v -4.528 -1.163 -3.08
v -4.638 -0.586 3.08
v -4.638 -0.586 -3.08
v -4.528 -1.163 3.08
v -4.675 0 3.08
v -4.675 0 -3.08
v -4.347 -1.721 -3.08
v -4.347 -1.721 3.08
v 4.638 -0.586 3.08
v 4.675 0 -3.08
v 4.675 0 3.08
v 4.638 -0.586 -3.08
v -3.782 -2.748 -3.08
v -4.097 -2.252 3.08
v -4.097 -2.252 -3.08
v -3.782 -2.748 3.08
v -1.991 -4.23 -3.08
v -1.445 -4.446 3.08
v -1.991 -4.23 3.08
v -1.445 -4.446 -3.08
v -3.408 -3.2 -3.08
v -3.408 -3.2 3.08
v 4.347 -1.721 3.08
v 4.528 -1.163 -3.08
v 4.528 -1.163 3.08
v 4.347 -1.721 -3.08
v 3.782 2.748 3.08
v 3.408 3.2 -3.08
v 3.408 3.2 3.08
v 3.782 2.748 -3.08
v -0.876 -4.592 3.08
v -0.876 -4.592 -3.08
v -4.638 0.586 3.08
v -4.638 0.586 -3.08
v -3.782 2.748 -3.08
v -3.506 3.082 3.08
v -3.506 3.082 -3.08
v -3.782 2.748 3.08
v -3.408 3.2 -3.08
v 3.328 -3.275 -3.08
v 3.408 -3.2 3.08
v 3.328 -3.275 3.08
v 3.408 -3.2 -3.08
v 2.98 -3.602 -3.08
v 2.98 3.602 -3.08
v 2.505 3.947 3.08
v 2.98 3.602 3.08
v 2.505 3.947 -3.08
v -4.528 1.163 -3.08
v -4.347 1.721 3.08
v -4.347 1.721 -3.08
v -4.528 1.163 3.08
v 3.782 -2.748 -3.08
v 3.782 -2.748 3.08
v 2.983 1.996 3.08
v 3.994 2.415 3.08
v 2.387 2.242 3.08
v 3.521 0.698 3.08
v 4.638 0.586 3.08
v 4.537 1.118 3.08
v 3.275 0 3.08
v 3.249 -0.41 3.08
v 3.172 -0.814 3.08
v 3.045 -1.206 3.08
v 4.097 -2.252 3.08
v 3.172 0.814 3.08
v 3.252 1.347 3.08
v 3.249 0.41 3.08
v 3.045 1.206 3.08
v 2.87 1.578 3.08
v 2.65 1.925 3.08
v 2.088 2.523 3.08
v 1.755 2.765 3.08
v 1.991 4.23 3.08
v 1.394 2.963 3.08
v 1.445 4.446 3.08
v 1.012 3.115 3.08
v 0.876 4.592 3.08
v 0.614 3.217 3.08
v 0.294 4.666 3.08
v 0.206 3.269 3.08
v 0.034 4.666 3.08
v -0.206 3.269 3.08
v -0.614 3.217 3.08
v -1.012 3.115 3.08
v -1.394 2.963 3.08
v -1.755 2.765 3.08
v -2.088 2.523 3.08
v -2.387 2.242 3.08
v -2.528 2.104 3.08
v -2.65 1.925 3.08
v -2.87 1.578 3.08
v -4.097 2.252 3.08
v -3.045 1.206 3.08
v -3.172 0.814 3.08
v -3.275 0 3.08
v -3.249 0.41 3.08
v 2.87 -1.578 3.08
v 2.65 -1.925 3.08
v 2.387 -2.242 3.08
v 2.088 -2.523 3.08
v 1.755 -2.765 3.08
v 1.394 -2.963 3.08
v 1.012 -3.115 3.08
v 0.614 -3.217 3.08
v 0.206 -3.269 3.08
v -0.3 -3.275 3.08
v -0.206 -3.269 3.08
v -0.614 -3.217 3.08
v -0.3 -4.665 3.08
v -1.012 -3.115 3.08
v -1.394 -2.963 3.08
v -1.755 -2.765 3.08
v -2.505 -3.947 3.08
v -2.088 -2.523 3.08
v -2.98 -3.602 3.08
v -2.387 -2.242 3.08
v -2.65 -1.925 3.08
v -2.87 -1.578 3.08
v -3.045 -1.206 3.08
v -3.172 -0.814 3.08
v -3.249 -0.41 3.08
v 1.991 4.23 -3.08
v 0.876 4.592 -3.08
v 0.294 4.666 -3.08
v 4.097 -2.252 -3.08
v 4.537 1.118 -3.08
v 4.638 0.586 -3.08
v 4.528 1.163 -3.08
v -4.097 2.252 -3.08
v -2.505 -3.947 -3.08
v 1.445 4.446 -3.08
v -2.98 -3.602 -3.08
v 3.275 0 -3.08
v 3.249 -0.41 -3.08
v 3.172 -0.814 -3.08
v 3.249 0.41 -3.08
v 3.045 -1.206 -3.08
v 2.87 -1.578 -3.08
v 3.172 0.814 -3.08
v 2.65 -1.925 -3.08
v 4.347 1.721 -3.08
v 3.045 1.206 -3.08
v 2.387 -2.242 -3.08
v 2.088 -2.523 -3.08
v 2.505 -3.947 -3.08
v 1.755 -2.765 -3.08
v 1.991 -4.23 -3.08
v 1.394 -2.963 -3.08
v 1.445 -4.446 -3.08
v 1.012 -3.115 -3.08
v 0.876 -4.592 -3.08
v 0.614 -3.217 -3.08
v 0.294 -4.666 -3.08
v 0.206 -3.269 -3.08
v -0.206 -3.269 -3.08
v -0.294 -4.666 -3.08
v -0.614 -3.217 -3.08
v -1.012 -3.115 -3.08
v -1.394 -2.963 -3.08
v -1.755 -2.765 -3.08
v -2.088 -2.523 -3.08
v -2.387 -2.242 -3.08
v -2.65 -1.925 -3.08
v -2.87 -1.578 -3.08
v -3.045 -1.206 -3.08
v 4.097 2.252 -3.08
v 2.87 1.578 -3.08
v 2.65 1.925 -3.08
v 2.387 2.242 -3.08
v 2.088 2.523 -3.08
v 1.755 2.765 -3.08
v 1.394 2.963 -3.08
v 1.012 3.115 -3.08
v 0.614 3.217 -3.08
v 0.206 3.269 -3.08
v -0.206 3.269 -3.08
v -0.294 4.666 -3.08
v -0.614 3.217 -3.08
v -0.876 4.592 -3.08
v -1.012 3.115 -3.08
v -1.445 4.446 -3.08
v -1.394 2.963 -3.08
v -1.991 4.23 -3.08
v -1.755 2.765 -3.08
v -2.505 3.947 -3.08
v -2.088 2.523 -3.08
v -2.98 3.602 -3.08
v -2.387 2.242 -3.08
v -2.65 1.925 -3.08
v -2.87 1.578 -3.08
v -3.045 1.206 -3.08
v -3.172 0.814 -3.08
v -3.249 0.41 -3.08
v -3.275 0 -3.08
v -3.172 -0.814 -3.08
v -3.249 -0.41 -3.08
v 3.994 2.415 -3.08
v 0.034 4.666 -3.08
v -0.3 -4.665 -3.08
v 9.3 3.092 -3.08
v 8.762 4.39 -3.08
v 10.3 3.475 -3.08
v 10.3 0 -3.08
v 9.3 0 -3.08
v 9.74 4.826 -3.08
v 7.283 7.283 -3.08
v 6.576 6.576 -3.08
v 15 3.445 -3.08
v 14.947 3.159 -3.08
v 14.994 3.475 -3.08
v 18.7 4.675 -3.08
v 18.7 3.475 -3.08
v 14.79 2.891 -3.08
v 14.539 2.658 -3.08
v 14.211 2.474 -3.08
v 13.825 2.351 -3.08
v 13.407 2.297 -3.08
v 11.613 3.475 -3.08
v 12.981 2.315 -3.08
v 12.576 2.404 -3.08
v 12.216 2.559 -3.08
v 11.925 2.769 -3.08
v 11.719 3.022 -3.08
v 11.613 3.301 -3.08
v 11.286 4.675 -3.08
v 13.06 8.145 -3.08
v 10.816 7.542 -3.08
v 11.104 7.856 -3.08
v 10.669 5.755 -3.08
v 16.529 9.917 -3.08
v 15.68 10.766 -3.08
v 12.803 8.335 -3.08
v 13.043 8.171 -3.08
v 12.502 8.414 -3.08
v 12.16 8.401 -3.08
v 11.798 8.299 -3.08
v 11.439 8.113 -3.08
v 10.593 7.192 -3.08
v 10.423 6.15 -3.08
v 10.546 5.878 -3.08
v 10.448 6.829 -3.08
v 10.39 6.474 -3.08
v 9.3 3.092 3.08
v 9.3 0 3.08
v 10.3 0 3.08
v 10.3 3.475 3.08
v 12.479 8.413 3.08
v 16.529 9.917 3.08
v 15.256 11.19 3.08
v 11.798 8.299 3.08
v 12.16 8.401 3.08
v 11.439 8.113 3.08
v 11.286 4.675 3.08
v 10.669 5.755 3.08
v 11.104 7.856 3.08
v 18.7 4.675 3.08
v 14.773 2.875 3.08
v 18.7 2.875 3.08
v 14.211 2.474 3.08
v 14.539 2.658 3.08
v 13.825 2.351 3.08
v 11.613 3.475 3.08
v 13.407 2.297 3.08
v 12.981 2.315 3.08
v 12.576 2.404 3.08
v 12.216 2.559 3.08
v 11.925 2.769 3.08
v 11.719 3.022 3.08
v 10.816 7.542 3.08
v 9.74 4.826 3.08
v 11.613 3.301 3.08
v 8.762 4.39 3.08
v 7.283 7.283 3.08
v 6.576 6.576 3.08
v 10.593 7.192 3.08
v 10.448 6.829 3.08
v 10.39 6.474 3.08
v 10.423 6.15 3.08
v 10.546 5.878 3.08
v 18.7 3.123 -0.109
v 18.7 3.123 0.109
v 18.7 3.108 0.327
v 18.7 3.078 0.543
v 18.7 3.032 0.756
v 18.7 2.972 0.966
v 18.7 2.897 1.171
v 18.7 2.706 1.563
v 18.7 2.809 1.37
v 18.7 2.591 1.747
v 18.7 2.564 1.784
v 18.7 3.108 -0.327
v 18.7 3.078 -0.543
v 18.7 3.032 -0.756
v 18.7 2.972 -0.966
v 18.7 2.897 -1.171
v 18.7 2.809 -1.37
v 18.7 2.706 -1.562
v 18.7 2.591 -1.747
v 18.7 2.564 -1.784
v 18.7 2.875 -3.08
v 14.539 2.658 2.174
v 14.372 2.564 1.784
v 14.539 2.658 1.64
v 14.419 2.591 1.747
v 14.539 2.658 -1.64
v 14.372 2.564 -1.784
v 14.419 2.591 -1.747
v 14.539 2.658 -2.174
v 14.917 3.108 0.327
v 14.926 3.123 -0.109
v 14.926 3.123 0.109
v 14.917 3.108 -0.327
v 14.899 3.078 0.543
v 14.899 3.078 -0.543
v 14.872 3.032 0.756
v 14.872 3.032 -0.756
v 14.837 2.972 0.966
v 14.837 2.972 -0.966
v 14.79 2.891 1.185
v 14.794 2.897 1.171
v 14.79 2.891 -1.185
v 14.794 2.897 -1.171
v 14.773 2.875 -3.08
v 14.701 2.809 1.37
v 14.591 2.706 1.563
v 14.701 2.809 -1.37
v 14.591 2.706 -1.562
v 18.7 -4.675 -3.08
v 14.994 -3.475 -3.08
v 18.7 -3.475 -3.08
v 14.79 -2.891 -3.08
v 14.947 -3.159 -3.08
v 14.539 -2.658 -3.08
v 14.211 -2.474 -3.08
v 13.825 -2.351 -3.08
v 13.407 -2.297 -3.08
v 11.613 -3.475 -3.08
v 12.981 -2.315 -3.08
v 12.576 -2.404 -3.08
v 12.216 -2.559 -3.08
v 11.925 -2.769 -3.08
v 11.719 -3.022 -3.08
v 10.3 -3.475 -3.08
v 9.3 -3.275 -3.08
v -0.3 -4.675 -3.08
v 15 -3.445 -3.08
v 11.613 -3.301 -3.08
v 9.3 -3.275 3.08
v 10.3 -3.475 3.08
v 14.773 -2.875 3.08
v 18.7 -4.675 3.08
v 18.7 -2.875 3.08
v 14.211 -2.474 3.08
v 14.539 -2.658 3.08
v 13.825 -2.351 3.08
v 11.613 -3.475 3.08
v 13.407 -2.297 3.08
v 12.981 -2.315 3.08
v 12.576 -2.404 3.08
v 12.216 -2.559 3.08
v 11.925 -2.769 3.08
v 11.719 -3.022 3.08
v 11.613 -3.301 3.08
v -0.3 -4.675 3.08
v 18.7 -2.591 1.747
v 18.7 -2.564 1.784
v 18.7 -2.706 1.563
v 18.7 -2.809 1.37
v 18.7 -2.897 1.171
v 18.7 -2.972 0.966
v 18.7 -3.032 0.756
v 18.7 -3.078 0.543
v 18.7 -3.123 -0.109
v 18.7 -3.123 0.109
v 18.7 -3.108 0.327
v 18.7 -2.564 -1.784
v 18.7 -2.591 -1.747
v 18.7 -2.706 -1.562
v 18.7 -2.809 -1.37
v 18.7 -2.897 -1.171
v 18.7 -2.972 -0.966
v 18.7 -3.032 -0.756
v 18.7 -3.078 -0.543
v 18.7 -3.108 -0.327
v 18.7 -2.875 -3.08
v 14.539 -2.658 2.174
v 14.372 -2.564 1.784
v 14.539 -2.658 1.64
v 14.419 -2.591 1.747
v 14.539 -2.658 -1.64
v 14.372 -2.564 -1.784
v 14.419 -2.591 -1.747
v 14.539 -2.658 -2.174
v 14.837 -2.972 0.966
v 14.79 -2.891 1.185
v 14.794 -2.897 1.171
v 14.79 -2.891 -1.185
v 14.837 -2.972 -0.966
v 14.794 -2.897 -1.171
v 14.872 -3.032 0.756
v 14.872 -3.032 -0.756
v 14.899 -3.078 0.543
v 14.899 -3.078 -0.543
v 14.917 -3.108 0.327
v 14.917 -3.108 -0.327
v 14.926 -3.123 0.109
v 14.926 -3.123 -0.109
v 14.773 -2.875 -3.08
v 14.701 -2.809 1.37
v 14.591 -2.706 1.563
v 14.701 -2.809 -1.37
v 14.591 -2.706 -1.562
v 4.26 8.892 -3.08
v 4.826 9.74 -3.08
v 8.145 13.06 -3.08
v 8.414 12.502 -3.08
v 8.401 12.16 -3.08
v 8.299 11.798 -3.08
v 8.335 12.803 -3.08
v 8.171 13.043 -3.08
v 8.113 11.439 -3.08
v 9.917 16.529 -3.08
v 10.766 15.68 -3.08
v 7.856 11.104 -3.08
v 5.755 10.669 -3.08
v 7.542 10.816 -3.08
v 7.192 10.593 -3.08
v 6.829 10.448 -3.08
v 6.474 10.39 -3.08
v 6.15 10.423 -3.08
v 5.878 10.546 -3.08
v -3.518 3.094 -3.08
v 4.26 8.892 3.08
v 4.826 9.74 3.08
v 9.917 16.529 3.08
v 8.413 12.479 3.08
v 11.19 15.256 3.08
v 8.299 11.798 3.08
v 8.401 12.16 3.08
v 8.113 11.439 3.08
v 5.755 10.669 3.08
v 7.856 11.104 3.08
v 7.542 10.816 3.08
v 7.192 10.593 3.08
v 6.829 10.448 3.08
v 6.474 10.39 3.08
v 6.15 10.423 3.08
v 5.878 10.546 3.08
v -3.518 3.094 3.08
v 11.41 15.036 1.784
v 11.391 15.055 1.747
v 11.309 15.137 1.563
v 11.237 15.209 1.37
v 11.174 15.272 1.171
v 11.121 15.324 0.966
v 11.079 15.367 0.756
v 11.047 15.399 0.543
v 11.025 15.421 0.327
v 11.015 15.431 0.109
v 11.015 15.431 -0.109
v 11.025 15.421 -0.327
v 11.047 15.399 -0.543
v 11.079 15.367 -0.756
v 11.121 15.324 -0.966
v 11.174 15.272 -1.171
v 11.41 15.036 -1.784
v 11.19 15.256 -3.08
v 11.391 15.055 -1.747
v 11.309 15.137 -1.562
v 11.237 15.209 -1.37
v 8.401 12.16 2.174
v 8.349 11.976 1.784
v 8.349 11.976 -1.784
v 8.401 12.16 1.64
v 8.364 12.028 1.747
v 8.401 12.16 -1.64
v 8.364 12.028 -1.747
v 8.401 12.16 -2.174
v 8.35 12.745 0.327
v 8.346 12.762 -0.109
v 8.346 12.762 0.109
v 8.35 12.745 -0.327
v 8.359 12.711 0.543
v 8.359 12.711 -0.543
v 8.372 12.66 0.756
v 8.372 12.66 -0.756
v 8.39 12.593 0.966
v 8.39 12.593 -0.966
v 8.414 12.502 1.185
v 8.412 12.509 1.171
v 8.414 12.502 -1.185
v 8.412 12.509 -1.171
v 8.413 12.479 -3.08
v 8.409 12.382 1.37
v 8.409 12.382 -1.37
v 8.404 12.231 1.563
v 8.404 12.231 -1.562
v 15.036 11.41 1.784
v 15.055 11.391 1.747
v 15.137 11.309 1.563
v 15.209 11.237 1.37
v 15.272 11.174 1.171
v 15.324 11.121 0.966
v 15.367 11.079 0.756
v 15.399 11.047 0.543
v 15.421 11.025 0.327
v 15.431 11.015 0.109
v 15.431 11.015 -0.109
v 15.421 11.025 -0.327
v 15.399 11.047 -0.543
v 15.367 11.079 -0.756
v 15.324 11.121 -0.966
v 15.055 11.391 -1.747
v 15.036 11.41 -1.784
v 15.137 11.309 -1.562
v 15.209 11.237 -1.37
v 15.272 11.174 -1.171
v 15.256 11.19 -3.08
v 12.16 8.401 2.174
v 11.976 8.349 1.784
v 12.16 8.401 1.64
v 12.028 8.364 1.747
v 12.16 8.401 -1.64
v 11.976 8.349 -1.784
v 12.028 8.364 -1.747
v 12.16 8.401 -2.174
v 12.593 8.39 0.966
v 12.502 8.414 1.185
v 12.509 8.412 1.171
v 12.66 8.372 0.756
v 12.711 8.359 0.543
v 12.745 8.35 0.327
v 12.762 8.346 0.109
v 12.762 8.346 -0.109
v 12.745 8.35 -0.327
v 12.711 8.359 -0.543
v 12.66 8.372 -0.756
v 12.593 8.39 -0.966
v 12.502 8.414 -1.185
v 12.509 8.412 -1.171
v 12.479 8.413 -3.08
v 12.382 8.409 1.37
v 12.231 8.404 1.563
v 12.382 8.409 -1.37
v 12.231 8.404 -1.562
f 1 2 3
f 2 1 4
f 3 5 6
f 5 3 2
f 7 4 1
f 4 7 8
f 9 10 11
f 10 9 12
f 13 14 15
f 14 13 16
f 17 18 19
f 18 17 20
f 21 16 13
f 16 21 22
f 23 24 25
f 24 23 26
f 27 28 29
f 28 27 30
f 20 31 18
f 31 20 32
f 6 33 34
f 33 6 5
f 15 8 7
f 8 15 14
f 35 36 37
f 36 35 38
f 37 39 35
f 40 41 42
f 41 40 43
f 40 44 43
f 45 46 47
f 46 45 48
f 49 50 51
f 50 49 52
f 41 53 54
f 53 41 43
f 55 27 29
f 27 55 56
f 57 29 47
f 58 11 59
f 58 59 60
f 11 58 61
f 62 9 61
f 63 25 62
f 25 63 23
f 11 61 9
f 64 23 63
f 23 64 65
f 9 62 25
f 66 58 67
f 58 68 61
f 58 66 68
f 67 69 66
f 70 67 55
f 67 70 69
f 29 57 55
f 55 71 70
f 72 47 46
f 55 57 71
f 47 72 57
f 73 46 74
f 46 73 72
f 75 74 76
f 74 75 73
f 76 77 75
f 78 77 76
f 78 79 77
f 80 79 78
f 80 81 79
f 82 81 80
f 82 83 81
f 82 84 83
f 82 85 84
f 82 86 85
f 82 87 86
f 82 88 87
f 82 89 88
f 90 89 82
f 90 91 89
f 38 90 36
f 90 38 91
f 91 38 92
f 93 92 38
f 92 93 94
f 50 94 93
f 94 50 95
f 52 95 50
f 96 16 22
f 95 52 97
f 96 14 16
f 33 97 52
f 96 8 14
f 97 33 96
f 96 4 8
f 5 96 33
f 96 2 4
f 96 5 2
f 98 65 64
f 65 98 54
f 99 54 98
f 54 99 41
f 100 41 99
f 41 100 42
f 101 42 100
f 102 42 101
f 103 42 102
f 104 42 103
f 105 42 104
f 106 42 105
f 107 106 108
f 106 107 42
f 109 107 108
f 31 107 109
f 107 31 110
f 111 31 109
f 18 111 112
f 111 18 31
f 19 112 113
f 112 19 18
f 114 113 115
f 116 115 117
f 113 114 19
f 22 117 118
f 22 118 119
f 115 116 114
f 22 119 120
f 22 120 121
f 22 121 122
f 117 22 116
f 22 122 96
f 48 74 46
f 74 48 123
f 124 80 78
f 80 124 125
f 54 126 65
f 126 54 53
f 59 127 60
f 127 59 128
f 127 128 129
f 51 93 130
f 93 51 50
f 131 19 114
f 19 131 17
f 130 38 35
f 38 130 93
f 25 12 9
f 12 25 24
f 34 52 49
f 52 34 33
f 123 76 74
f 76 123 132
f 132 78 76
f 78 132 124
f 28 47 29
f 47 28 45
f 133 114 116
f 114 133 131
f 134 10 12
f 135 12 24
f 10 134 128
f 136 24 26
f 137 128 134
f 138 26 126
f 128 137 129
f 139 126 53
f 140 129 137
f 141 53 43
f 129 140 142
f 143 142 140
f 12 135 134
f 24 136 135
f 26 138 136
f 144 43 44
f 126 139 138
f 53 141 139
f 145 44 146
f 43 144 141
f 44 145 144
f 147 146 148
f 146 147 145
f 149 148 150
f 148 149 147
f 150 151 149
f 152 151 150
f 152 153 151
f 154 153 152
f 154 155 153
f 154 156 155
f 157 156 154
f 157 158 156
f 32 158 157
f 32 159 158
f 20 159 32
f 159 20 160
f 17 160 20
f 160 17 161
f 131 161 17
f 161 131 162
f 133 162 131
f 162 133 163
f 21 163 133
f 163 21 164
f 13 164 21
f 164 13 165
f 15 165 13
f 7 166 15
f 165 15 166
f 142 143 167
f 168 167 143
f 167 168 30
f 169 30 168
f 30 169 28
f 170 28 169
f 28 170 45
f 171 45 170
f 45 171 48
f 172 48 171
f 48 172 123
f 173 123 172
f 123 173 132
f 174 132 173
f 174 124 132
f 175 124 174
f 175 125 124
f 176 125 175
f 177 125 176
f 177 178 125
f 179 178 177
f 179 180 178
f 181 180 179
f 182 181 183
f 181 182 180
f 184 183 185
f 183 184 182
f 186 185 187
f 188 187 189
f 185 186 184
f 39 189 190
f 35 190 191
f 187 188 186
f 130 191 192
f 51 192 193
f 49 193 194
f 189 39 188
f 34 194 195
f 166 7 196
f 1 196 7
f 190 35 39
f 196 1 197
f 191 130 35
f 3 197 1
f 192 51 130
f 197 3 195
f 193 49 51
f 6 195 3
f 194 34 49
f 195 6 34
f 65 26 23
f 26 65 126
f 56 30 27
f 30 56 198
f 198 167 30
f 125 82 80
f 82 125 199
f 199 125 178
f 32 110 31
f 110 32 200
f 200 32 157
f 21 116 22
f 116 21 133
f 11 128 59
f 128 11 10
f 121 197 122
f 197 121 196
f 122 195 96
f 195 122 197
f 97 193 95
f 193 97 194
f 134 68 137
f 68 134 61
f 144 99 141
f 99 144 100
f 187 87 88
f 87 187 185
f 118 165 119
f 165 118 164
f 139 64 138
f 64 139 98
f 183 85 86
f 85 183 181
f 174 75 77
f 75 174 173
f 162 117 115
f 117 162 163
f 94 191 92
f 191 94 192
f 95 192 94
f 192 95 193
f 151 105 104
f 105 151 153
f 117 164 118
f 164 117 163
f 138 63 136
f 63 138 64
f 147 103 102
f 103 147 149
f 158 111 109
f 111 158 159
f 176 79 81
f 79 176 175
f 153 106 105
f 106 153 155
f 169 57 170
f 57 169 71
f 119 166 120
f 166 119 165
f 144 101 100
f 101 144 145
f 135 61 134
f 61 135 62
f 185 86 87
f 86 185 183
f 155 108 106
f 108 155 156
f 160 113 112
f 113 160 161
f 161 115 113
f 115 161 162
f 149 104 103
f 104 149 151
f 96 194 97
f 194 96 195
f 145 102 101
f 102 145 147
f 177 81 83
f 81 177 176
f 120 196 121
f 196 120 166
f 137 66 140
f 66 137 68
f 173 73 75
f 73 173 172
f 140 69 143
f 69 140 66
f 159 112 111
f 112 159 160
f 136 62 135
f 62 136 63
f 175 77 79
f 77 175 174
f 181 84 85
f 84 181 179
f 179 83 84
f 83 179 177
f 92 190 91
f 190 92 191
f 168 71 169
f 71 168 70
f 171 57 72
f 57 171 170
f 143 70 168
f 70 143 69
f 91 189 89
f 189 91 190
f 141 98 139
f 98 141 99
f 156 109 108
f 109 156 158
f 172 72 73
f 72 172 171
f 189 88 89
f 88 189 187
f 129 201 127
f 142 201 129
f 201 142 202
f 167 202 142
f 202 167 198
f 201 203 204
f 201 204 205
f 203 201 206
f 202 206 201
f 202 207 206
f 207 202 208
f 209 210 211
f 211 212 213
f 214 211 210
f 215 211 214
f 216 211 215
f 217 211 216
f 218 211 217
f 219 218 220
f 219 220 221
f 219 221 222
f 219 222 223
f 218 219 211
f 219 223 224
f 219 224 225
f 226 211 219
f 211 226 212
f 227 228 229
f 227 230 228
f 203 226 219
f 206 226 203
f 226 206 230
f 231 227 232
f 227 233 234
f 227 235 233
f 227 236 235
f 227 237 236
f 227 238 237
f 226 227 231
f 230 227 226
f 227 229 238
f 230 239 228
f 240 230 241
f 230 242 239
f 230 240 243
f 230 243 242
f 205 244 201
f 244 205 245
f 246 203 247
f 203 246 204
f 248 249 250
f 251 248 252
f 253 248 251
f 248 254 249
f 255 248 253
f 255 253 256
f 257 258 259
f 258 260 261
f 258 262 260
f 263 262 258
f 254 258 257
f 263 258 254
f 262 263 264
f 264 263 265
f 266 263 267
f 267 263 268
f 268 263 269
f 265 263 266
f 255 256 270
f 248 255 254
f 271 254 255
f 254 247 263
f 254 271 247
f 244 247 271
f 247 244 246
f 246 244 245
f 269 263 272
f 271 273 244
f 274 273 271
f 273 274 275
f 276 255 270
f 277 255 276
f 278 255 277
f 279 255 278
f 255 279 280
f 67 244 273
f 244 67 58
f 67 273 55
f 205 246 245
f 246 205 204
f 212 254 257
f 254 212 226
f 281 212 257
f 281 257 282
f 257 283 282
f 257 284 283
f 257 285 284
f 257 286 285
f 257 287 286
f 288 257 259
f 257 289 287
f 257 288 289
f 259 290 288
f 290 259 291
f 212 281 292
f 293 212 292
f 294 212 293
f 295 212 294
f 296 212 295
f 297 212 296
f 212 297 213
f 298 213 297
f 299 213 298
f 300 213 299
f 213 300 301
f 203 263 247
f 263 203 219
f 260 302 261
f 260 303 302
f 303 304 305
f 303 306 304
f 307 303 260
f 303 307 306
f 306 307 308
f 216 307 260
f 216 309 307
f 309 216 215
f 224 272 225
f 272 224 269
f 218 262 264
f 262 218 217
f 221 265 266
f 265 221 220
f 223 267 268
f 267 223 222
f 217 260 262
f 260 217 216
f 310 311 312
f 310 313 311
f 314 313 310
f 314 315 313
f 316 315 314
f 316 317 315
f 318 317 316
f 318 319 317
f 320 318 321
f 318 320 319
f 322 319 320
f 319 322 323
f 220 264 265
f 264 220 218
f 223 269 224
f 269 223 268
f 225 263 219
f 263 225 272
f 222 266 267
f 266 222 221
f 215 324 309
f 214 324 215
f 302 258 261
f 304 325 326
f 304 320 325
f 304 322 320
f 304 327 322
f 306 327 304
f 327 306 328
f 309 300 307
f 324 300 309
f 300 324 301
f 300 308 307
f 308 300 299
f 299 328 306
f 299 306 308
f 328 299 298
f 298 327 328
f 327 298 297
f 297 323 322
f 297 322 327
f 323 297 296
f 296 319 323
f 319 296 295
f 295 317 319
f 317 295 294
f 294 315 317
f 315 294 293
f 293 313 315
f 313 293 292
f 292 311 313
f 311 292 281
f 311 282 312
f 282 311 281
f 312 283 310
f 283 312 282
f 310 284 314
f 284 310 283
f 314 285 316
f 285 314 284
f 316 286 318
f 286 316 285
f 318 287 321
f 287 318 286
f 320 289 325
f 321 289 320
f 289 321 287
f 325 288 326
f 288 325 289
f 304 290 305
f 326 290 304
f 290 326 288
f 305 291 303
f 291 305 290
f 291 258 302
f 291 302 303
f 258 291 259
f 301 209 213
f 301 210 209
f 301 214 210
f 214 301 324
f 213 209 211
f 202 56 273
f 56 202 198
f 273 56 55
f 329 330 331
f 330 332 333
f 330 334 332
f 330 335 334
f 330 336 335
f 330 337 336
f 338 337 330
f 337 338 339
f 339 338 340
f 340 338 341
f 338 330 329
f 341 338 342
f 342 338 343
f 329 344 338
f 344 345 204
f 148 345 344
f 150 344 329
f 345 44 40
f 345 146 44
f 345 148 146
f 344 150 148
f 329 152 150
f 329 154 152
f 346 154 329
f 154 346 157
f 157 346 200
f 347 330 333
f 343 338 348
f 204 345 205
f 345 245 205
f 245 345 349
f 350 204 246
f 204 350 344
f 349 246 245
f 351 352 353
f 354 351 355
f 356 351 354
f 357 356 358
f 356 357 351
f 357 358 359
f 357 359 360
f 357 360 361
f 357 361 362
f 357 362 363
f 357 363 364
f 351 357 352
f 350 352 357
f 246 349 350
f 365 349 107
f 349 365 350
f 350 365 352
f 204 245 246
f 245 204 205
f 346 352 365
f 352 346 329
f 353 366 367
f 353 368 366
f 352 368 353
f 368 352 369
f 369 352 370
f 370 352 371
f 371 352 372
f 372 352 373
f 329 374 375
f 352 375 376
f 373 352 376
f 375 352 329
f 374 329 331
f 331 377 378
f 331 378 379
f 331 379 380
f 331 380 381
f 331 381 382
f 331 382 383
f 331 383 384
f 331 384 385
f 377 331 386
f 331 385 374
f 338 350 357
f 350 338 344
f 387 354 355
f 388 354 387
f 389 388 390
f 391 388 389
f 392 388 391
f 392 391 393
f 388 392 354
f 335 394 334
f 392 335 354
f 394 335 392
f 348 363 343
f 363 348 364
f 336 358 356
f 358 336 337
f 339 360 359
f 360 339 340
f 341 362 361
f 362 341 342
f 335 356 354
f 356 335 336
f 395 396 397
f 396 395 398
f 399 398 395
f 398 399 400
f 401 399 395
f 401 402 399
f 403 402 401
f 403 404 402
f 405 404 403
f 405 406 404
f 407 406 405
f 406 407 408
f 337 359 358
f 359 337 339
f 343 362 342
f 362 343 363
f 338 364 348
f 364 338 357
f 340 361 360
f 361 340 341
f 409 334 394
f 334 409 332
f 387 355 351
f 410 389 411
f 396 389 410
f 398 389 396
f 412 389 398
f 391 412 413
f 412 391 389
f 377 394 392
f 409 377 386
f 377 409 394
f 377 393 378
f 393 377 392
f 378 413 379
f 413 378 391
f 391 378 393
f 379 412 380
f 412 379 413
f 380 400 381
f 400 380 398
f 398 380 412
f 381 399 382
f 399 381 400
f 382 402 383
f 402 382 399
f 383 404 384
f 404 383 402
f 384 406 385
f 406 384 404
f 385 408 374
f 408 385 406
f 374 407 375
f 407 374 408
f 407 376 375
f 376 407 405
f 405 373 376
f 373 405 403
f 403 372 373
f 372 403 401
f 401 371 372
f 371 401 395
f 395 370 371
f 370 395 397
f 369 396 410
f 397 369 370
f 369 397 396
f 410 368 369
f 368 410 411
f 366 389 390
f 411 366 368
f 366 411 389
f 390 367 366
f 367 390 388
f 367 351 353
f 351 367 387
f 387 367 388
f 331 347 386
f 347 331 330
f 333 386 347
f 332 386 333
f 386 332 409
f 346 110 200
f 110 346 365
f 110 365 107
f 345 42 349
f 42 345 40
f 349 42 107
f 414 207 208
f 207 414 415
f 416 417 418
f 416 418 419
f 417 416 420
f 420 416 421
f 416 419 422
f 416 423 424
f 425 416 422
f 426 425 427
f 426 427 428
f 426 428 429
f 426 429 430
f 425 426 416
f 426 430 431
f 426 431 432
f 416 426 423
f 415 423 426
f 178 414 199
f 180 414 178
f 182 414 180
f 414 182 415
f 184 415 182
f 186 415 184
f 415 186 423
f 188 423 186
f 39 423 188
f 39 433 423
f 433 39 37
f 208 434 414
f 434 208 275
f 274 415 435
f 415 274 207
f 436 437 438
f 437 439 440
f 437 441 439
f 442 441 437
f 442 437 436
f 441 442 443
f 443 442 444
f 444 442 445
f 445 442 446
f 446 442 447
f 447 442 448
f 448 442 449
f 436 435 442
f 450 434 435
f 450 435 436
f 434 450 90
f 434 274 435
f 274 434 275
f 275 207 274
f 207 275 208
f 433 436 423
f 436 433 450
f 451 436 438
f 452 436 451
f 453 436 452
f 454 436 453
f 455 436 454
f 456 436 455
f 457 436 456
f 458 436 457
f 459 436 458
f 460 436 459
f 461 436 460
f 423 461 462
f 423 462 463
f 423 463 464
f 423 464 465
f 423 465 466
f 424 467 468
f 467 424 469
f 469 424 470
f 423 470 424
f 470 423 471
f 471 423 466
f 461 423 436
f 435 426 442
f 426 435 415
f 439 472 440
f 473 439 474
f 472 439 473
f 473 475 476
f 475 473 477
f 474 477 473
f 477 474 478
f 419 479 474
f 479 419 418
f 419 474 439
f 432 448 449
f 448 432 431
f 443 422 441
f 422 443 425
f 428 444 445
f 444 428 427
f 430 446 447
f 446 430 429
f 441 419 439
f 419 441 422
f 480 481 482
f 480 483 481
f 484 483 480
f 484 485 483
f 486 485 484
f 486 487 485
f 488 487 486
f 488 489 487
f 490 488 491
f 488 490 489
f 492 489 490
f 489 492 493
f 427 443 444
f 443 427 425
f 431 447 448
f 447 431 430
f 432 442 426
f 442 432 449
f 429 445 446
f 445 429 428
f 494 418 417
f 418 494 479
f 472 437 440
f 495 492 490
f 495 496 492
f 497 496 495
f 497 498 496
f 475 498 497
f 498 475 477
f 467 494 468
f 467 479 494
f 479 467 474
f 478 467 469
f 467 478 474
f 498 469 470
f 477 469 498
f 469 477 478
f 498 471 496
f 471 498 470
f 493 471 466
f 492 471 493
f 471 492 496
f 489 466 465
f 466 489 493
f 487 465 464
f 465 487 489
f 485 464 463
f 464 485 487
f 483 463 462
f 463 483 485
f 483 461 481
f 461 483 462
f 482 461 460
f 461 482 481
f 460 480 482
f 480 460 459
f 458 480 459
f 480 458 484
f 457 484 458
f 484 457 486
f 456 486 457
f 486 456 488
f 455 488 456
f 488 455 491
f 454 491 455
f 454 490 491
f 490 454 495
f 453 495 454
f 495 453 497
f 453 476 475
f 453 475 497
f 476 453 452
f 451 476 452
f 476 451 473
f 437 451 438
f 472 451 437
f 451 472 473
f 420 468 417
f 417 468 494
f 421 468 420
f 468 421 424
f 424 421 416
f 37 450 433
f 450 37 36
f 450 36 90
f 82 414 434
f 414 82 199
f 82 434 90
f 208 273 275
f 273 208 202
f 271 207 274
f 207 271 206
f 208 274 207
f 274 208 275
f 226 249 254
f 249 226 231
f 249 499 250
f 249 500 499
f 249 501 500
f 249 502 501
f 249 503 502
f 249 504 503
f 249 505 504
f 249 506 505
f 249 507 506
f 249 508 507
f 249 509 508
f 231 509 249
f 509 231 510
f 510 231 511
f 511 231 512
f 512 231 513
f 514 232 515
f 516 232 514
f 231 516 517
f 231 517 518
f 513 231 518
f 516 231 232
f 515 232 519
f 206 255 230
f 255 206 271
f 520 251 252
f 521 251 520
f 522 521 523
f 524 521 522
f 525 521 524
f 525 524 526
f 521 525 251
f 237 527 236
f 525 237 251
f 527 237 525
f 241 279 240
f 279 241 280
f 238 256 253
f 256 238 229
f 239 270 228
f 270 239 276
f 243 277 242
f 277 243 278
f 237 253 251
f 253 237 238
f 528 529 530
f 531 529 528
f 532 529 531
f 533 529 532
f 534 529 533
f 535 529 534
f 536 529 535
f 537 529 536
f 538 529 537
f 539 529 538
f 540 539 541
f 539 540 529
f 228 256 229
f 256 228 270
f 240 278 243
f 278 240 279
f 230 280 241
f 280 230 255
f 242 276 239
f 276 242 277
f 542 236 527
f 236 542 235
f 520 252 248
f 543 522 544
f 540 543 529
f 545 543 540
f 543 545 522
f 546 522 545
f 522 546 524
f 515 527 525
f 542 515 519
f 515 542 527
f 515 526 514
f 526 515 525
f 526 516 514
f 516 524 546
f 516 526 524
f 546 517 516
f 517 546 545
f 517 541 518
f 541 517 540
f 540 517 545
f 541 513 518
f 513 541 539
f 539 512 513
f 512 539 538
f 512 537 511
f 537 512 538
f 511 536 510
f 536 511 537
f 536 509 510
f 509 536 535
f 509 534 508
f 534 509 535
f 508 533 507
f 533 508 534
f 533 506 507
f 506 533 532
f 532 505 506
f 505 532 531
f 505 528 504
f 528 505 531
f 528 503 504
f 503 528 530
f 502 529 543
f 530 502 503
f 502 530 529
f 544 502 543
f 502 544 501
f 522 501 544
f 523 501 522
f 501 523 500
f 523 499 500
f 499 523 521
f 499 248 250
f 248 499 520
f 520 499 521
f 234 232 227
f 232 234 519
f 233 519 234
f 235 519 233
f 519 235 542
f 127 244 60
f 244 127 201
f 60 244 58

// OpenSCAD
// file: lib/knex_lib.scad
// K'Nex Parts Library — shared modules for all part SCADs
// Geometry derived from https://www.printables.com/model/143840-knex-parts-customizable
// Measurements in millimeters (digital calipers)

knexDiameter = 6.25;

// --- Rod modules ---

module RodEnd(height) {
    difference() {
        cylinder(h=height, d=knexDiameter, $fn=50);
        // Snap groove near the tip
        translate([0, 0, height - 3.1])
        scale([1, 1, 1.93])
        rotate_extrude(convexity=10, $fn=30)
        translate([3.125, 0, 0])
        scale([1, 1, 0])
        circle(r=0.905, $fn=20);
    }
}

module RodCenter(length) {
    // Cross-shaped center section (+ profile)
    intersection() {
        cylinder(h=length, d=knexDiameter, $fn=50);
        union() {
            translate([-.95, -knexDiameter/2, 0])
            cube([1.9, knexDiameter + 1, length]);
            translate([-knexDiameter/2, -.95, 0])
            cube([knexDiameter + 1, 1.9, length]);
        }
    }
}

module fullRod(endHeight, centerLength) {
    // Builds along Z: from -endHeight to centerLength+endHeight
    translate([0, 0, centerLength])
    RodEnd(endHeight);
    RodCenter(centerLength);
    mirror([0, 0, 1])
    RodEnd(endHeight);
}

module fullRod2(externalLength, internalLength) {
    // Convenience: specify overall and center-section lengths
    fullRod((externalLength - internalLength) / 2, internalLength);
}

// --- Connector modules ---

module ConnectorCenter(height, width) {
    difference() {
        cylinder(h=height, d=6.55 + width * 2, $fn=50);
        translate([0, 0, -0.5])
        cylinder(h=height + 1, d=6.55, $fn=50);
    }
}

module ConnectorEndpt(i, c, a, j) {
    union() {
        translate([0, 0, 9.4 - 1])
        cube([6.16, 9.35/2, 1]);
        cube([6.16, 1.2, 9.4]);
        translate([6.16/2, 1.23, 6.16 - 3.8/5])
        scale([1, 2.3, 3.4])
        rotate([0, 90, 0])
        cylinder(d=1, h=6.16, $fn=25, center=true);
        linear_extrude(height=6)
        difference() {
            polygon(points=[
                [0, 0], [6.16, 0], [6.16, 1.8],
                [6.16 - 1.46, 2.15], [1.46, 2.15], [0, 1.8]
            ]);
            translate([6.16/2, 9.35/2, 0])
            circle(d=6.25, $fn=90);
        }
    }
    if (i > 0) {
        if ((((i == c && j == 1) || (i == 1 && j == 2)) && c < 8) || a - 360 > 80) {
            // Straight locking tab (for end arms or wide-angle connectors)
            translate([0, 0, 9])
            cube([6.16, 1.4, 10]);
        }
        else {
            // Angled locking tab (for tight-angle connectors)
            translate([0, 0, 9.25])
            rotate([-45/2])
            cube([6.16, 1.4, 7]);
        }
    }
}

module ConnectorEnd(i=0, c=0, a=45) {
    translate([0, -9.35/2, 6.16])
    rotate([0, 90, 0])
    union() {
        ConnectorEndpt(i, c, a, 1);
        translate([0, 9.35, 0])
        mirror([0, 1, 0])
        ConnectorEndpt(i, c, a, 2);
    }
}

// Arm offset from center to ConnectorEnd origin
_arm_offset = -(23.15 - (6.5 + 1.4) / 2) + 0.5;

module Connector(c, a=45) {
    // c = number of arms, a = angle parameter (use 360+spacing for proper tab logic)
    // Effective arm spacing = a mod 360
    union() {
        ConnectorCenter(6.16, 1.4);
        for (i = [1:c]) {
            rotate([0, 0, (i-1) * a])
            translate([_arm_offset, 0, 0])
            ConnectorEnd(i, c, a);
        }
    }
}
// main file
// K'NEX Grey 2-Way 45° Connector
// Two arms at 0° and 45° (45° arm spacing)
include <lib/knex_lib.scad>
$fn = 72;

translate([0, 0, -6.16/2])
rotate([0, 0, 180])
Connector(2, 405);
